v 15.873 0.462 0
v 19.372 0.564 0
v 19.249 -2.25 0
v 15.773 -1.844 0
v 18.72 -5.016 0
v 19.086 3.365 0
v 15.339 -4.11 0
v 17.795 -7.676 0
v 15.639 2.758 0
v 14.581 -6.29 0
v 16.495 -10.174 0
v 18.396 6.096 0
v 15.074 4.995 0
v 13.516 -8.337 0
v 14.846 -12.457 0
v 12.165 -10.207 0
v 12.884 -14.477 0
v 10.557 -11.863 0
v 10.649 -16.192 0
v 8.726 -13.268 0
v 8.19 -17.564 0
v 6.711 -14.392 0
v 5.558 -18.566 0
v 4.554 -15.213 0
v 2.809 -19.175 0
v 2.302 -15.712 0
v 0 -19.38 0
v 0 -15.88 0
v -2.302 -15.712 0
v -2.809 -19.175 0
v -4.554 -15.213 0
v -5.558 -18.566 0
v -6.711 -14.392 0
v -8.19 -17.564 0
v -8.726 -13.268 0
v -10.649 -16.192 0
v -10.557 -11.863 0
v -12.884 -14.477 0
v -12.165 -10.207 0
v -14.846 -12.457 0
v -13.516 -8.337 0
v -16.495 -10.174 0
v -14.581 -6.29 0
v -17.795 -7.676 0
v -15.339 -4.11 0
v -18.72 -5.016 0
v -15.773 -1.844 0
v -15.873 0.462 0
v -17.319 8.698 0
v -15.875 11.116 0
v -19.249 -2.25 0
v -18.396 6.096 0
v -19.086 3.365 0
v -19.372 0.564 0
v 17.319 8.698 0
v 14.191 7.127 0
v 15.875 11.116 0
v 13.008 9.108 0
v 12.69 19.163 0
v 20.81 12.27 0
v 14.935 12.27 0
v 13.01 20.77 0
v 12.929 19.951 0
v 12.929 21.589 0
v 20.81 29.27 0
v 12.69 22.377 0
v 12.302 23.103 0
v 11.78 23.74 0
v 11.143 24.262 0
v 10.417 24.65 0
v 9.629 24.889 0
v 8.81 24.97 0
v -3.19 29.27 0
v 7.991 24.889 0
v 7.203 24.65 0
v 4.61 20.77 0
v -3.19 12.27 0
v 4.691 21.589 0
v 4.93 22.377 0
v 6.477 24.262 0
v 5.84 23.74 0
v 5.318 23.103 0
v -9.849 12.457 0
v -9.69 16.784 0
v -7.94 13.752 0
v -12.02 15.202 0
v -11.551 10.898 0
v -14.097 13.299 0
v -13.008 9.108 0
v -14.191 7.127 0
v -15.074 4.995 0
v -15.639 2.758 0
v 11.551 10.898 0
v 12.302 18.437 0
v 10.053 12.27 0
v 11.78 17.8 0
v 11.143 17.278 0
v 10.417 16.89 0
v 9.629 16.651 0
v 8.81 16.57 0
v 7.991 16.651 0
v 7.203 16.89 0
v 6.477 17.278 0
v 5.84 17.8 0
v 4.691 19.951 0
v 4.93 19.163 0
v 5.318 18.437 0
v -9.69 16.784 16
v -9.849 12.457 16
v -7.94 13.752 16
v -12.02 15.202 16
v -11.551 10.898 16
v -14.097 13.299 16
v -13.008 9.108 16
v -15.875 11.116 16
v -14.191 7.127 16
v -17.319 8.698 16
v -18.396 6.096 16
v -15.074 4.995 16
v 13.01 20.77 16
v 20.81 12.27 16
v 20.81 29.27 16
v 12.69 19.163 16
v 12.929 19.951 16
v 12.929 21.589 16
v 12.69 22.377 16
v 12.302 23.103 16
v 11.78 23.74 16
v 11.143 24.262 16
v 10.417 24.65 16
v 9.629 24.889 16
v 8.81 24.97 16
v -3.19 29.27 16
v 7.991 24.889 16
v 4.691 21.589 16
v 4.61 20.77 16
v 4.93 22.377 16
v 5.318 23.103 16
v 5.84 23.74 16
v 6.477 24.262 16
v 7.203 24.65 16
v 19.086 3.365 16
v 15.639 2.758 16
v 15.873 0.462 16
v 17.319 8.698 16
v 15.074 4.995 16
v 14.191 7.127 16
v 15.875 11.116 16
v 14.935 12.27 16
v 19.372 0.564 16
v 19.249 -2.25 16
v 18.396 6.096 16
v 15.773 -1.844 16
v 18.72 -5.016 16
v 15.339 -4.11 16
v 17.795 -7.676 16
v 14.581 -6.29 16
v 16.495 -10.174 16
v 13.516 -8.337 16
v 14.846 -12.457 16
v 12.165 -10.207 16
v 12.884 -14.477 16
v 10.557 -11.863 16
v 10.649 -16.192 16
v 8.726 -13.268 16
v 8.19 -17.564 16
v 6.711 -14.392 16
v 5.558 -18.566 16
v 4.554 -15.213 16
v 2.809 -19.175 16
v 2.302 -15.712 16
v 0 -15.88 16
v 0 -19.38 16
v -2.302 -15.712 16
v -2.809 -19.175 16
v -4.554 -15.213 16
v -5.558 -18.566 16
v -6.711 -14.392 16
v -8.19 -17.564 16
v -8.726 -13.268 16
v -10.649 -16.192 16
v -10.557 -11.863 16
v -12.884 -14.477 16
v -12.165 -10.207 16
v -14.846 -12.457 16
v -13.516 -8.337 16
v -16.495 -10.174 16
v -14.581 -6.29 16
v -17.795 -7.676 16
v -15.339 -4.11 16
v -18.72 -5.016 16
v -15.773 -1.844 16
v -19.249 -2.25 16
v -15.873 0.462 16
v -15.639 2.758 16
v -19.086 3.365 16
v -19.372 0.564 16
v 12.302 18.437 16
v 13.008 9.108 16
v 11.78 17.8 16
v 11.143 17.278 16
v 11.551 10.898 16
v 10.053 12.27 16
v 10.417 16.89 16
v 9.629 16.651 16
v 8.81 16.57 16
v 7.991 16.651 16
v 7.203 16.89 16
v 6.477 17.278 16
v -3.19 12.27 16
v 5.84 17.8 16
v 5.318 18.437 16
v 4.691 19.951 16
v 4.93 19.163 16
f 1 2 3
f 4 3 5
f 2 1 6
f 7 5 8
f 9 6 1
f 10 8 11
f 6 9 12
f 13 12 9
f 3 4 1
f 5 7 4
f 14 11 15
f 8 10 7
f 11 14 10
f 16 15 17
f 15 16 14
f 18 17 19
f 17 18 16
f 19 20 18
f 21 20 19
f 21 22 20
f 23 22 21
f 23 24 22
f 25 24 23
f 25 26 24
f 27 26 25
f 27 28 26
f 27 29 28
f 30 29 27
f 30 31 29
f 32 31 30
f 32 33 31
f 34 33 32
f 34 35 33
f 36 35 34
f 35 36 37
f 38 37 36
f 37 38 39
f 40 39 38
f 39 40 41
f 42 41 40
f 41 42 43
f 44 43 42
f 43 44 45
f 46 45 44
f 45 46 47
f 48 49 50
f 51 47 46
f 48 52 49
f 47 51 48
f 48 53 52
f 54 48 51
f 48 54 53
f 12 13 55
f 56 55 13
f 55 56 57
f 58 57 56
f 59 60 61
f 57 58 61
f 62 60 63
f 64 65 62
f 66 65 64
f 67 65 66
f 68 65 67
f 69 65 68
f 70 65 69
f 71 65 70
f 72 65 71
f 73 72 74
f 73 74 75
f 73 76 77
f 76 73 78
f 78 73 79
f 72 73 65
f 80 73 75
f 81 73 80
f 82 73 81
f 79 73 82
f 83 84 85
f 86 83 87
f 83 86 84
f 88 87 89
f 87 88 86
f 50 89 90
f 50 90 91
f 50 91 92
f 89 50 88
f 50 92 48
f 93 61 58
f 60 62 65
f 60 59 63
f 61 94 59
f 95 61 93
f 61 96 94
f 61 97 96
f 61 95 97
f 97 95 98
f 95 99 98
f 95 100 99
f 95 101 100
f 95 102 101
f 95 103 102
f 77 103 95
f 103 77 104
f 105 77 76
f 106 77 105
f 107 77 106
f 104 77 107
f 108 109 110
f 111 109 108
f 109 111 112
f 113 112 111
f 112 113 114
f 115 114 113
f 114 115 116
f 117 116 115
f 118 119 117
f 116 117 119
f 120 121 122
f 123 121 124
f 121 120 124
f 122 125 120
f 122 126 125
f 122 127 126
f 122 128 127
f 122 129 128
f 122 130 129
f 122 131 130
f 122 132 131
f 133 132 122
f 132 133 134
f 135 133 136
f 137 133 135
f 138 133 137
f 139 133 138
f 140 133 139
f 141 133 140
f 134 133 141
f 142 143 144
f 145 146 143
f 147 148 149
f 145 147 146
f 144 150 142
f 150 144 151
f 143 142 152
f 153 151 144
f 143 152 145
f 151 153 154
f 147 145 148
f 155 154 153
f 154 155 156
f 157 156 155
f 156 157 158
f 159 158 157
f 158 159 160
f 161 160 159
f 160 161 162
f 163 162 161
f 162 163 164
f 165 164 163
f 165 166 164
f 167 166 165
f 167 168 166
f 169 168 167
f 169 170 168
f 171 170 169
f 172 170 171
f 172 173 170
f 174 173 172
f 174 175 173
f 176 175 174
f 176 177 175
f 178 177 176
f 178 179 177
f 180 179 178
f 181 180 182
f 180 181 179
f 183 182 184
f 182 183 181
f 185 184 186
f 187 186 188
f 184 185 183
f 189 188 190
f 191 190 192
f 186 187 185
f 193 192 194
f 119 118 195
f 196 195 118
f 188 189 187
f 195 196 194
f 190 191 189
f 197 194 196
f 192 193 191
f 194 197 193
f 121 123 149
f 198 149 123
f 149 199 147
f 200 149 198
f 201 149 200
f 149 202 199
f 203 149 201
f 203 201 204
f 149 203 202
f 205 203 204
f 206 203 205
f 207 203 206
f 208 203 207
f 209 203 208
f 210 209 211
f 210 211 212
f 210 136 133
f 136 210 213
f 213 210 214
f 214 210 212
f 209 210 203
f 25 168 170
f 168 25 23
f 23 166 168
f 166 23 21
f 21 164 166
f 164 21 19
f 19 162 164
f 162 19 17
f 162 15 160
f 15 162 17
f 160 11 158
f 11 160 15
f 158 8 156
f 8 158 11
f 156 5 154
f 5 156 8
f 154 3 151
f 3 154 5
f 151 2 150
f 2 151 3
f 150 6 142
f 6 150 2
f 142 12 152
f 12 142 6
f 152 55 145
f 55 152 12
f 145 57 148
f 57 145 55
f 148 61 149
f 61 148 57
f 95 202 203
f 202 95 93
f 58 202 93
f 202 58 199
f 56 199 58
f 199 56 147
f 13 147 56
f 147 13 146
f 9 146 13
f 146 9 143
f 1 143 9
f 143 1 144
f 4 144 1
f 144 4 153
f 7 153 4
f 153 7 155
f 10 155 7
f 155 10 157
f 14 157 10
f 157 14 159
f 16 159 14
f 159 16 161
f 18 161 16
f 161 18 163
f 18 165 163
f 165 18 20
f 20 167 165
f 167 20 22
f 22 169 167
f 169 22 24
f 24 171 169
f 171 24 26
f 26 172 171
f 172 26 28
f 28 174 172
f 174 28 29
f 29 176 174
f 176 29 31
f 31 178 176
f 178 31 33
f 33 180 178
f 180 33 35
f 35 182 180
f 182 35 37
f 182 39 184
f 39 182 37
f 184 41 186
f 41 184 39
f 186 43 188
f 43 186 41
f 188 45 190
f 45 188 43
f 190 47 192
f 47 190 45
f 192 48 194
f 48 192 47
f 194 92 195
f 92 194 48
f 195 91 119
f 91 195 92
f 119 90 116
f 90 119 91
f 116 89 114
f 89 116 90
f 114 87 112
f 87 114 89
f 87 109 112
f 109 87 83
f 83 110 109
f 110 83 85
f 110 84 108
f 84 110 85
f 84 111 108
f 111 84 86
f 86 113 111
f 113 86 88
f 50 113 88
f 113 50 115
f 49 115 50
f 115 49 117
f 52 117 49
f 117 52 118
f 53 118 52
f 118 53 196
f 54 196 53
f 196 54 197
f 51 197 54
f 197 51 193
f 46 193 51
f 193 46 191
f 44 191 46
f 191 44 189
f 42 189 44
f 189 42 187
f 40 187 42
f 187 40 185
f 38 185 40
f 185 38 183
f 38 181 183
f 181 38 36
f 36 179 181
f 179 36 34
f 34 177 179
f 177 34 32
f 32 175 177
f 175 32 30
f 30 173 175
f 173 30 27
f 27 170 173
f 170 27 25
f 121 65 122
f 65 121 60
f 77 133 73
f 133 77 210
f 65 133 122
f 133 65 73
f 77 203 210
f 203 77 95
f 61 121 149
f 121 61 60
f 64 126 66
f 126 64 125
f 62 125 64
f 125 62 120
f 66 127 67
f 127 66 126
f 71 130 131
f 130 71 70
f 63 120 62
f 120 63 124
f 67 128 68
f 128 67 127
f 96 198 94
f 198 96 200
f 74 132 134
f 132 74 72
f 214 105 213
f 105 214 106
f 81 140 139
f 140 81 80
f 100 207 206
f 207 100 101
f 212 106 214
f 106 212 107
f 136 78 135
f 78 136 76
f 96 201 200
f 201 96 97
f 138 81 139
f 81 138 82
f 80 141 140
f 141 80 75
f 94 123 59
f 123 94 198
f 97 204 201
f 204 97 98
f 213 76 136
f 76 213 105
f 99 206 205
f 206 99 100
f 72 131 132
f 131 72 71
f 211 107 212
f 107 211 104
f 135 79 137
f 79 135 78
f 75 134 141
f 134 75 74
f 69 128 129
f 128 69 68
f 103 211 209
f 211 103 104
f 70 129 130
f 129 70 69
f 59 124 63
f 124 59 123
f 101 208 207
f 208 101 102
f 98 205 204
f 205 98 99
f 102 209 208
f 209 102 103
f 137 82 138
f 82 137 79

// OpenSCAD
$fn = 32;

// ----------------------------------------------------------------------
// Pipe clamp: 38.76 mm ring, 3.5 mm wall, 16 mm wide
// ----------------------------------------------------------------------

// --- parameters (mm) ---
outer_r = 19.38;          // clamp outside radius
inner_r = 15.88;          // pipe bore radius
band = 3.5;               // band thickness
clamp_w = 16;             // clamp width
opening = 60;             // opening angle between the ends
lug_w = 24;               // lug width
lug_len = 17;             // lug length
bolt_d = 8.4;             // bolt hole

clamp_profile = [[-9.69, 16.784], [-12.02, 15.202], [-14.097, 13.299], [-15.875, 11.116], [-17.319, 8.698], [-18.396, 6.096], [-19.086, 3.365], [-19.372, 0.564], [-19.249, -2.25], [-18.72, -5.016], [-17.795, -7.676], [-16.495, -10.174], [-14.846, -12.457], [-12.884, -14.477], [-10.649, -16.192], [-8.19, -17.564], [-5.558, -18.566], [-2.809, -19.175], [0, -19.38], [2.809, -19.175], [5.558, -18.566], [8.19, -17.564], [10.649, -16.192], [12.884, -14.477], [14.846, -12.457], [16.495, -10.174], [17.795, -7.676], [18.72, -5.016], [19.249, -2.25], [19.372, 0.564], [19.086, 3.365], [18.396, 6.096], [17.319, 8.698], [15.875, 11.116], [14.097, 13.299], [12.02, 15.202], [9.69, 16.784], [7.94, 13.752], [9.849, 12.457], [11.551, 10.898], [13.008, 9.108], [14.191, 7.127], [15.074, 4.995], [15.639, 2.758], [15.873, 0.462], [15.773, -1.844], [15.339, -4.11], [14.581, -6.29], [13.516, -8.337], [12.165, -10.207], [10.557, -11.863], [8.726, -13.268], [6.711, -14.392], [4.554, -15.213], [2.302, -15.712], [0, -15.88], [-2.302, -15.712], [-4.554, -15.213], [-6.711, -14.392], [-8.726, -13.268], [-10.557, -11.863], [-12.165, -10.207], [-13.516, -8.337], [-14.581, -6.29], [-15.339, -4.11], [-15.773, -1.844], [-15.873, 0.462], [-15.639, 2.758], [-15.074, 4.995], [-14.191, 7.127], [-13.008, 9.108], [-11.551, 10.898], [-9.849, 12.457], [-7.94, 13.752]];

difference() {
  union() {
    linear_extrude(height = clamp_w) polygon(clamp_profile);
    /* bolt lug on the other end */
    translate([-3.19, 12.27, 0]) cube([lug_w, 17, clamp_w]);
  }
  translate([8.81, 20.77, -2.5]) cylinder(h = clamp_w + 5, d = bolt_d);
}
